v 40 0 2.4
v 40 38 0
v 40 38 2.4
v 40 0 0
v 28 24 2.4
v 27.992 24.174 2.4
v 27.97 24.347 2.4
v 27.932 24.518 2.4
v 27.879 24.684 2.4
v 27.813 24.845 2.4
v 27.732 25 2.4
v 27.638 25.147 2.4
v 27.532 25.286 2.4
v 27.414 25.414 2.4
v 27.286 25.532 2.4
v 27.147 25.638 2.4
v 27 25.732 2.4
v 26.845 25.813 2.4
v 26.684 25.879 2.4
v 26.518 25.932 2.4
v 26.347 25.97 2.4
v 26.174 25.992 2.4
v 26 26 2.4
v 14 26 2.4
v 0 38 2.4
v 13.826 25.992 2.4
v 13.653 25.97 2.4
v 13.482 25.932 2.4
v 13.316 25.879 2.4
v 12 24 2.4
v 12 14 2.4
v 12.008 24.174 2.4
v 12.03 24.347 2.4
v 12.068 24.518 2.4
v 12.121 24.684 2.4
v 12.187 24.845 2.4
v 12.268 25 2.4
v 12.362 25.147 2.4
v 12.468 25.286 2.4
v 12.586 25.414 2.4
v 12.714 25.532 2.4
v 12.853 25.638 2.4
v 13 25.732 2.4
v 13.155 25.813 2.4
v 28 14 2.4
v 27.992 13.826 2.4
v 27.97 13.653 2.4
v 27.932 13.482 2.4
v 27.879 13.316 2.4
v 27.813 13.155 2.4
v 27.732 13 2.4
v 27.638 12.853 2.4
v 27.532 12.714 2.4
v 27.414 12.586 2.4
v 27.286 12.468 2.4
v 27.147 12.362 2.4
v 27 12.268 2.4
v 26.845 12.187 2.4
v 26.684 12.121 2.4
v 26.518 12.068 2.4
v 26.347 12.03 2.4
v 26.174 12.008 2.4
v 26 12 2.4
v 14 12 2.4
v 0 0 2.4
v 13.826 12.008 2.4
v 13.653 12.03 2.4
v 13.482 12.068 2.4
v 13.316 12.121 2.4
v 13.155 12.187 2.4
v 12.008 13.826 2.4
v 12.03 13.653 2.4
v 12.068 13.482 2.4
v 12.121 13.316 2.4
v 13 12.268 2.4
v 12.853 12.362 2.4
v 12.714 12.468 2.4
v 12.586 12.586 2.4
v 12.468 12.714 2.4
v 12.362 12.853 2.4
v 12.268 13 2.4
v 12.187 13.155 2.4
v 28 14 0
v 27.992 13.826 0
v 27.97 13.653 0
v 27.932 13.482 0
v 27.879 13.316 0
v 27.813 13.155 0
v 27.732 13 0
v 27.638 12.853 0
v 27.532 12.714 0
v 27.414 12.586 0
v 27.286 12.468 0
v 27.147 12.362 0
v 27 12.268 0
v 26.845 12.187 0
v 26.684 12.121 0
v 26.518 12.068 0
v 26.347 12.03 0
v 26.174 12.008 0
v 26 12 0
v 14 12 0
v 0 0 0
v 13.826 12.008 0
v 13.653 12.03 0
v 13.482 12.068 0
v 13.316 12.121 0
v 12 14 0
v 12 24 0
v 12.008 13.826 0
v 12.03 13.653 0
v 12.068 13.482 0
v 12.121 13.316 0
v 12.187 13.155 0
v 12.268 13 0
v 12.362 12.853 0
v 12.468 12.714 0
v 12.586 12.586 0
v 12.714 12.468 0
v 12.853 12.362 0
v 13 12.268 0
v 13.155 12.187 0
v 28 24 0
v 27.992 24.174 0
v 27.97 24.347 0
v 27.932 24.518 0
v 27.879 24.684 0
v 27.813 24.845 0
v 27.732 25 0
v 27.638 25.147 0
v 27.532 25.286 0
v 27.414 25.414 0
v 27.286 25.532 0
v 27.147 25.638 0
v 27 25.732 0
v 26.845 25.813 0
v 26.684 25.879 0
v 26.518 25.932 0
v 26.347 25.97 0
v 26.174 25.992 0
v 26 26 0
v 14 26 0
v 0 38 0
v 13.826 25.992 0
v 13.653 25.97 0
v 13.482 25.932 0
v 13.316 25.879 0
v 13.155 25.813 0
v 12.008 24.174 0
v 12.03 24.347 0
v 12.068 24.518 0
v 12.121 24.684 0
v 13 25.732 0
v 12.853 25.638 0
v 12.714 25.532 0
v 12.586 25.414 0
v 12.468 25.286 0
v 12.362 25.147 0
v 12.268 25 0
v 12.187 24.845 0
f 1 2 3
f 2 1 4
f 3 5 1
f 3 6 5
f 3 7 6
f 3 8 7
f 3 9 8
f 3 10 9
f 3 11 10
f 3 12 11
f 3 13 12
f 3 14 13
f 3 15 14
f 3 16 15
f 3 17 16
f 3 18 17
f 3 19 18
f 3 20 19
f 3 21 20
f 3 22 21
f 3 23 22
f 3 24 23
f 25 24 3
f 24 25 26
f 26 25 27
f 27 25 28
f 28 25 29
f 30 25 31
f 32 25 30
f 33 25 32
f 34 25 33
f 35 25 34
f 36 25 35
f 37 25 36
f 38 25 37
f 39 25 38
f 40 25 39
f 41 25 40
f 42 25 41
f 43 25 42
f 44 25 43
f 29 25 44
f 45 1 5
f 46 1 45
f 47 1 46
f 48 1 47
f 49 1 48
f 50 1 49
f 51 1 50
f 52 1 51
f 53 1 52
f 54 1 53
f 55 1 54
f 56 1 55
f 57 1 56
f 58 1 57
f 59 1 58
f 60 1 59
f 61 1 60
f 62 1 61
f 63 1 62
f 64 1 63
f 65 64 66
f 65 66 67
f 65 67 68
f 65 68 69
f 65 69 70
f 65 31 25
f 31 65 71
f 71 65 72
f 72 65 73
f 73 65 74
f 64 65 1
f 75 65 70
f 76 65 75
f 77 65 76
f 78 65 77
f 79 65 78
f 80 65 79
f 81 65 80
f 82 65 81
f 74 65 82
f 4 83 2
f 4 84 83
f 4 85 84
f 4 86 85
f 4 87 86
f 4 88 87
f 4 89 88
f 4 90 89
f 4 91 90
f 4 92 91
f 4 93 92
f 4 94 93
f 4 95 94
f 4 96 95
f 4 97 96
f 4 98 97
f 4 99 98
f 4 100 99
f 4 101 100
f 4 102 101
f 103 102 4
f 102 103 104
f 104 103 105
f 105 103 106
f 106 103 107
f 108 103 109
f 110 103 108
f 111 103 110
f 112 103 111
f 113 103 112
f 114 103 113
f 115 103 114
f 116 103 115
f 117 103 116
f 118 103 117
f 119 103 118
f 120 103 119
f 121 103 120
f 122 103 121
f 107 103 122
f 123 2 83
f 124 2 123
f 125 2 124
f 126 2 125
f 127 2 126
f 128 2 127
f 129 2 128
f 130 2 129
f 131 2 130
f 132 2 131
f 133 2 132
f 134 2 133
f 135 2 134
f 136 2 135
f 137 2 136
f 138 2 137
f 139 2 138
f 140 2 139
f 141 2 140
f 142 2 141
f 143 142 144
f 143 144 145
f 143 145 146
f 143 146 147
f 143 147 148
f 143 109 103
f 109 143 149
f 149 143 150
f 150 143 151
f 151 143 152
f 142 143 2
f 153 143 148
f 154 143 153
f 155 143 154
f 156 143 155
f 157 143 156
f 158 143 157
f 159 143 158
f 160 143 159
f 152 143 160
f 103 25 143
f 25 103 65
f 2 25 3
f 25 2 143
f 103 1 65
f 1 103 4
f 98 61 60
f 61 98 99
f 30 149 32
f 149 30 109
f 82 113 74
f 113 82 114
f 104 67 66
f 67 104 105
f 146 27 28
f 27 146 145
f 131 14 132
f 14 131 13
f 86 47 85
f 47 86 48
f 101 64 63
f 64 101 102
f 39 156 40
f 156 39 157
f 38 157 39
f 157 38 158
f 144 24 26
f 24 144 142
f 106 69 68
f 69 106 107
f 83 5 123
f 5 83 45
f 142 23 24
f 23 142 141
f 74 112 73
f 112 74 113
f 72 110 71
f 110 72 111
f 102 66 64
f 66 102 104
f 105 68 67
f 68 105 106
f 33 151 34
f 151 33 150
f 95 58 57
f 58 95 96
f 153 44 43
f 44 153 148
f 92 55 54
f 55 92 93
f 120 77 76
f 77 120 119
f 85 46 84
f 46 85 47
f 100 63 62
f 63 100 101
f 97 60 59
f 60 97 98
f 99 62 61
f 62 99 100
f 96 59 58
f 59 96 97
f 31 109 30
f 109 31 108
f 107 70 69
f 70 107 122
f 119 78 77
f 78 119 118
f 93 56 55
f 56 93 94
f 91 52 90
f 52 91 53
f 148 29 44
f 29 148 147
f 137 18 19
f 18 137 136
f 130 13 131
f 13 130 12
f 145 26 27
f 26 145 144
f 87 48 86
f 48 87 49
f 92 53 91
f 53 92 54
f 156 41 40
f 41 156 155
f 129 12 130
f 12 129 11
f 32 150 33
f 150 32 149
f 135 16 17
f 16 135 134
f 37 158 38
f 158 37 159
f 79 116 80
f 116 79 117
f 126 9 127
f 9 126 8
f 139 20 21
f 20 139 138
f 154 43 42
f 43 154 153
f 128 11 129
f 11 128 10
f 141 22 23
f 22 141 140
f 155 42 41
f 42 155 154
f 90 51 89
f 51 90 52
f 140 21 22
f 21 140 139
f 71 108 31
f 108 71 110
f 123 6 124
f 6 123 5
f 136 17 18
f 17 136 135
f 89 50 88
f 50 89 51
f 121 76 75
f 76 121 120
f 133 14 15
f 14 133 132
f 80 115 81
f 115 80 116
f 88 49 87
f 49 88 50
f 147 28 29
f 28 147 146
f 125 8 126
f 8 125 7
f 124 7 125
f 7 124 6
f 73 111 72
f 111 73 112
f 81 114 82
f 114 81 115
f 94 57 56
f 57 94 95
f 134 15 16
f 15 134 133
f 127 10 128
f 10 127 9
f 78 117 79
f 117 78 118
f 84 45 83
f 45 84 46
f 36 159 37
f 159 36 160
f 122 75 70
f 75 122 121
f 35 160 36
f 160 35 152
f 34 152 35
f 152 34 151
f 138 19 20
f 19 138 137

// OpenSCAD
// ============================================================================
//  fit_test_rj45_wall.scad — RJ45 interface cutout test plate (enclosure-prep2)
//  Purpose: verify the RJ45 cutout size + corner radius and confirm the hole
//  pierces a wall_thickness-thick wall, before cutting the full enclosure.
//  Sizes are PLACEHOLDER — 待实测 (to-be-measured).
//
//  Values MUST be kept in sync with the matching parameter block at the top of
//  rough_enclosure_v1.scad (interfaces[0]).
//
//  Prints flat, no supports: a flat plate with the hole cut through its
//  2.4 mm thickness. Check an actual RJ45 jack/plug passes through freely.
// ============================================================================

$fn = 72;

// ---- keep in sync with rough_enclosure_v1.scad ----
wall_thickness = 2.4;
cutout_w = 16;   // RJ45 opening width  [placeholder, 待实测]
cutout_h = 14;   // RJ45 opening height [placeholder, 待实测]
cutout_r = 2;    // corner radius       [placeholder, 待实测]
// ------------------------------------------------
margin = 12;     // border around the cutout

plate_w = cutout_w + 2*margin;
plate_h = cutout_h + 2*margin;

module rounded_rect_2d(w, h, r) {
  if (r > 0) {
    offset(r = r) square([w - 2*r, h - 2*r], center = true);
  } else {
    square([w, h], center = true);
  }
}

difference() {
  cube([plate_w, plate_h, wall_thickness]);
  translate([plate_w/2, plate_h/2, -1])
    linear_extrude(height = wall_thickness + 2)
      rounded_rect_2d(cutout_w, cutout_h, cutout_r);
}
